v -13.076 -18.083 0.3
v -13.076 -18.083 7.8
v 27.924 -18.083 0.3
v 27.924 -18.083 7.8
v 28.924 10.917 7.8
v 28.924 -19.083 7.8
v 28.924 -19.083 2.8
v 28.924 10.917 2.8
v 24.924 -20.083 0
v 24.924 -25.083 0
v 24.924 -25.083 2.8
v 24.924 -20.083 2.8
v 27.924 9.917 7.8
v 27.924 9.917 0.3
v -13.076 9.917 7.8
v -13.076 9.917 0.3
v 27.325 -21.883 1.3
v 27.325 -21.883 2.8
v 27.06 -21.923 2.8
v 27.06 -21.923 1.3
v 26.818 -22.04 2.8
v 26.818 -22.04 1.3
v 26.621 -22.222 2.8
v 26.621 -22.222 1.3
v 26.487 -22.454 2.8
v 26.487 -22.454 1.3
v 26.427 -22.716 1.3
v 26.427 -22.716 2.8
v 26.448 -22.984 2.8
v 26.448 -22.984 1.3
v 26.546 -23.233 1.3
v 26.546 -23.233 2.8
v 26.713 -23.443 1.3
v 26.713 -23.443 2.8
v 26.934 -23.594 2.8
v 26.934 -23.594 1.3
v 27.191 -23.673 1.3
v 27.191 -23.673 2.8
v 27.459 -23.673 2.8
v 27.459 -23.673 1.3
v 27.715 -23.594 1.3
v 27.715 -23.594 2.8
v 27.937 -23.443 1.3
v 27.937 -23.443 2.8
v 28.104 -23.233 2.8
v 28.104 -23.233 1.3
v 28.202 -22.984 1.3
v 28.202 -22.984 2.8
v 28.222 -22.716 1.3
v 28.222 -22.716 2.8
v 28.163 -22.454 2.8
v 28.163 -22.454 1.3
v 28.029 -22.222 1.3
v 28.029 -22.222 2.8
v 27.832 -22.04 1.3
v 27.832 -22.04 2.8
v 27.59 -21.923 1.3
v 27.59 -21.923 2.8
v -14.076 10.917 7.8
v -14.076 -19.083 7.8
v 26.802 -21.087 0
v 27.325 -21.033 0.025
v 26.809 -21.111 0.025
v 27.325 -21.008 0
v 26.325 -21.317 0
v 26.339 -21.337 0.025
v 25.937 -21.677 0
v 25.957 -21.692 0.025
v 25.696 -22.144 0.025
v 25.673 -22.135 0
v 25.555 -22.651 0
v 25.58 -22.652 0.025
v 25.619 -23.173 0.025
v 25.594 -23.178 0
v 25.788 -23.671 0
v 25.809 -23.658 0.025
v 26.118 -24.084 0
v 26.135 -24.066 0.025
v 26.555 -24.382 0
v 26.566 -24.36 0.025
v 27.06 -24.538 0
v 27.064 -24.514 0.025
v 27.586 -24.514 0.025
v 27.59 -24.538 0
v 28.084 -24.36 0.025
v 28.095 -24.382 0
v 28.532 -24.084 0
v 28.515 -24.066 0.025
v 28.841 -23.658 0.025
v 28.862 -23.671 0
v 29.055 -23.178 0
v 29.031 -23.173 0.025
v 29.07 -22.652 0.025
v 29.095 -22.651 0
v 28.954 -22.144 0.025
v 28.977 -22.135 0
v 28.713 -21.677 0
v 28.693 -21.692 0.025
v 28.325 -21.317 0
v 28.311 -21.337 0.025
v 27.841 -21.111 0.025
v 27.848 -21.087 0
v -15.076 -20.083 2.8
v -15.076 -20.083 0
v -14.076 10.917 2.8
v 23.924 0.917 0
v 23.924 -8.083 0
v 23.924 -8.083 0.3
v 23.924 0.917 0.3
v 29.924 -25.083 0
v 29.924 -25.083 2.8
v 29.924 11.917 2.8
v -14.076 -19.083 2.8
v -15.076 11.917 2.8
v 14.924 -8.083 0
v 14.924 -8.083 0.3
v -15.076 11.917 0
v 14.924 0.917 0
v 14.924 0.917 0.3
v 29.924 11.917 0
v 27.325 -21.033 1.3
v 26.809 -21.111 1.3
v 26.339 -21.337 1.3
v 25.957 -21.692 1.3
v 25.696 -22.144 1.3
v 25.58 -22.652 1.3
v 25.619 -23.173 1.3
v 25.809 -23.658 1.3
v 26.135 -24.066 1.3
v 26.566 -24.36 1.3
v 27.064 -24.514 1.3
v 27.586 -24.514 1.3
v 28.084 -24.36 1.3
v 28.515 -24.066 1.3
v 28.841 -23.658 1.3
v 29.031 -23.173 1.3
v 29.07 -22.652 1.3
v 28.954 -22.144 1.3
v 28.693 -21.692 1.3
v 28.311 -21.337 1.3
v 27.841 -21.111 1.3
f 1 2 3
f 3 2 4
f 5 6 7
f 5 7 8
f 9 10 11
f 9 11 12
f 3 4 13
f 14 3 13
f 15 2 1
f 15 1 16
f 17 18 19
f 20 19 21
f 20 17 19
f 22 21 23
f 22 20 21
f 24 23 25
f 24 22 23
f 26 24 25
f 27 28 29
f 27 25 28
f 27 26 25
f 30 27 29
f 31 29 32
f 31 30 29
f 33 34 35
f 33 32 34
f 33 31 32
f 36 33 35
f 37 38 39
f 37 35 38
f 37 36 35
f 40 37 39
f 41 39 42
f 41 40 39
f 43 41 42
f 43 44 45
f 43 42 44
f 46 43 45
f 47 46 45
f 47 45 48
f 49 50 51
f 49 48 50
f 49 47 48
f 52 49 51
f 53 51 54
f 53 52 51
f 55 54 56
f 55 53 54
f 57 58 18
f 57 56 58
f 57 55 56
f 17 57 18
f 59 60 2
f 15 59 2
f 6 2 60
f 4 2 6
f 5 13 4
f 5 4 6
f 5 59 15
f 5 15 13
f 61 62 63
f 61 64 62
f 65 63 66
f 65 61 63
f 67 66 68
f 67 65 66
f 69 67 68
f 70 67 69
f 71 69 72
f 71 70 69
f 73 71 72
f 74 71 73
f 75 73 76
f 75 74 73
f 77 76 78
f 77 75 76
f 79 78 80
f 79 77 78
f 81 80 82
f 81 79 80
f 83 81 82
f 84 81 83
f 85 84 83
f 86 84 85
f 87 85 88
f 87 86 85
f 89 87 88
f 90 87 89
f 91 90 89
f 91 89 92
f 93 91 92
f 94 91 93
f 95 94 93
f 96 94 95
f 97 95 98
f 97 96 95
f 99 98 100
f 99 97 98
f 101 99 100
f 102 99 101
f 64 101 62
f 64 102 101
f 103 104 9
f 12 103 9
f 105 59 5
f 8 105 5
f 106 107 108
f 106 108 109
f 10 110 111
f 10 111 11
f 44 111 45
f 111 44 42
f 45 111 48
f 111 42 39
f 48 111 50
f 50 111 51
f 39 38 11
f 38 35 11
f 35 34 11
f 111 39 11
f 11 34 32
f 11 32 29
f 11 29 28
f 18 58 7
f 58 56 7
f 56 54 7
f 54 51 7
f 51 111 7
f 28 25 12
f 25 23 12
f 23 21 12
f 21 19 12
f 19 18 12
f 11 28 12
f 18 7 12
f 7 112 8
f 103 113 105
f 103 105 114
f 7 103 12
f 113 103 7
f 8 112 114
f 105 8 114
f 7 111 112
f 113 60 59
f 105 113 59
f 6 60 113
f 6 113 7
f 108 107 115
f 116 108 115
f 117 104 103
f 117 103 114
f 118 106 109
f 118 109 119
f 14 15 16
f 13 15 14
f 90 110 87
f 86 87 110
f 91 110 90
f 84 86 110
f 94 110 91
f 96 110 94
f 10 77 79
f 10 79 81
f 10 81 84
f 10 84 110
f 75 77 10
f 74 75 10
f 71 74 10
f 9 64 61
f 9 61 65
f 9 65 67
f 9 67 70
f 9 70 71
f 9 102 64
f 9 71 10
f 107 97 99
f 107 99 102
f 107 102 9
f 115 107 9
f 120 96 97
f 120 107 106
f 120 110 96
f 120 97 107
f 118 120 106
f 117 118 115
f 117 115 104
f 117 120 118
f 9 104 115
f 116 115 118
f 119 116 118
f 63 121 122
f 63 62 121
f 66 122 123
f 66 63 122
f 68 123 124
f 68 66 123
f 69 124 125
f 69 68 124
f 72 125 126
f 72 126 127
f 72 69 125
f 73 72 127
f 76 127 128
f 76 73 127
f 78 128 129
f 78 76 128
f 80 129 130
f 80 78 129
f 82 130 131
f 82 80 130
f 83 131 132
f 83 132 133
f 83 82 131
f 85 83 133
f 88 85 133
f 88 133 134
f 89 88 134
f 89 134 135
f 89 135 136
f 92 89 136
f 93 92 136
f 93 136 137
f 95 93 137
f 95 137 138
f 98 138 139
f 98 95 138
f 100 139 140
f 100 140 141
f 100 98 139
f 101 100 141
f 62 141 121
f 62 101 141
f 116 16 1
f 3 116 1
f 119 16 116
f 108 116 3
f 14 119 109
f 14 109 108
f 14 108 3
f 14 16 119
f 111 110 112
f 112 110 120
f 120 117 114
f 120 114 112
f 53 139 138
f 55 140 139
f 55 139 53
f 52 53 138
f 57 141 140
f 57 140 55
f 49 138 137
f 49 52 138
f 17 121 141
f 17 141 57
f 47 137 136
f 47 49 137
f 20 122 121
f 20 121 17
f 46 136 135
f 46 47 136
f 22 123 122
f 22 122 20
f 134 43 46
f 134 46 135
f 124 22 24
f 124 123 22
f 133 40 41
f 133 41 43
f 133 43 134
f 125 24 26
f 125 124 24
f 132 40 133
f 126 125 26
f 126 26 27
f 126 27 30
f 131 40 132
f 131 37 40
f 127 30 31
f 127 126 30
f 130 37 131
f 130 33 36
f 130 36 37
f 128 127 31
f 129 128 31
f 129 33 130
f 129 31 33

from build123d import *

# Parameters (mm, degrees)
ESQUISSE1_W             = 45
ESQUISSE1_H             = 32
BOSS_EXTRU_1_DEPTH      = 7.8
ESQUISSE2_W             = 41
ESQUISSE2_H             = 28
ENL_V_MAT_EXTRU_1_DEPTH = 7.5
ESQUISSE4_OUTSIDE_W     = 58.154
ESQUISSE4_OUTSIDE_H     = 45.154
ESQUISSE4_OUTSIDE_W_2   = 43
ESQUISSE4_OUTSIDE_H_2   = 30
ENL_V_MAT_EXTRU_2_DEPTH = 5
ESQUISSE5_W             = 9
ESQUISSE5_H             = 9
ENL_V_MAT_EXTRU_3_DEPTH = 5
ESQUISSE6_W             = 5
ESQUISSE6_H             = 5
BOSS_EXTRU_2_DEPTH      = 2.8


with BuildPart() as part:
    # Esquisse1 → Boss.-Extru.1 (new body)
    with BuildSketch(Plane.XY):
        with Locations((7.42437914, -4.08326268)):
            Rectangle(ESQUISSE1_W, ESQUISSE1_H)
    extrude(amount=BOSS_EXTRU_1_DEPTH)

    # Esquisse2 → Enlèv. mat.-Extru.1 (cut)
    with BuildSketch(Plane.XY.offset(7.8)):
        with Locations((7.42437914, -4.08326268)):
            Rectangle(ESQUISSE2_W, ESQUISSE2_H)
    extrude(amount=-ENL_V_MAT_EXTRU_1_DEPTH, mode=Mode.SUBTRACT)

    # Esquisse4 outside → Enlèv. mat.-Extru.2 (cut)
    with BuildSketch(Plane.XY.offset(7.8)):
        with Locations((7.424, -4.083)):
            Rectangle(ESQUISSE4_OUTSIDE_W, ESQUISSE4_OUTSIDE_H)
        with Locations((7.42437914, -4.08326268)):
            Rectangle(ESQUISSE4_OUTSIDE_W_2, ESQUISSE4_OUTSIDE_H_2, mode=Mode.SUBTRACT)
    extrude(amount=-ENL_V_MAT_EXTRU_2_DEPTH, mode=Mode.SUBTRACT)

    # Esquisse5 → Enlèv. mat.-Extru.3 (cut)
    with BuildSketch(Plane(origin=(0, 0, 0), x_dir=(-1, 0, 0), z_dir=(0, 0, -1))):
        with Locations((-19.42437914, -3.58326268)):
            Rectangle(ESQUISSE5_W, ESQUISSE5_H)
    extrude(amount=-ENL_V_MAT_EXTRU_3_DEPTH, mode=Mode.SUBTRACT)

    # Esquisse6 → Boss.-Extru.2 (add)
    with BuildSketch(Plane(origin=(0, 0, 0), x_dir=(-1, 0, 0), z_dir=(0, 0, -1))):
        with Locations((-27.42437914, -22.58326268)):
            Rectangle(ESQUISSE6_W, ESQUISSE6_H)
    extrude(amount=-BOSS_EXTRU_2_DEPTH)

    # Esquisse7 → Chambrage pour vis à tête ronde bombée M1.61 (revolve, cut)
    with BuildSketch(Plane(origin=(27.324958559, -22.78326268, 0), x_dir=(0, 1, 0), z_dir=(1, 0, 0))):
        Polygon((0, 0), (0, 7.790774557), (0.9, 7.25), (0.9, 1.3), (1.75, 1.3), (1.75, 0.025), (1.775, 0), align=None)
    revolve(axis=Axis((27.324958559, -22.78326268, -6.35), (0, 0, 1)), mode=Mode.SUBTRACT)


solid = part.part
